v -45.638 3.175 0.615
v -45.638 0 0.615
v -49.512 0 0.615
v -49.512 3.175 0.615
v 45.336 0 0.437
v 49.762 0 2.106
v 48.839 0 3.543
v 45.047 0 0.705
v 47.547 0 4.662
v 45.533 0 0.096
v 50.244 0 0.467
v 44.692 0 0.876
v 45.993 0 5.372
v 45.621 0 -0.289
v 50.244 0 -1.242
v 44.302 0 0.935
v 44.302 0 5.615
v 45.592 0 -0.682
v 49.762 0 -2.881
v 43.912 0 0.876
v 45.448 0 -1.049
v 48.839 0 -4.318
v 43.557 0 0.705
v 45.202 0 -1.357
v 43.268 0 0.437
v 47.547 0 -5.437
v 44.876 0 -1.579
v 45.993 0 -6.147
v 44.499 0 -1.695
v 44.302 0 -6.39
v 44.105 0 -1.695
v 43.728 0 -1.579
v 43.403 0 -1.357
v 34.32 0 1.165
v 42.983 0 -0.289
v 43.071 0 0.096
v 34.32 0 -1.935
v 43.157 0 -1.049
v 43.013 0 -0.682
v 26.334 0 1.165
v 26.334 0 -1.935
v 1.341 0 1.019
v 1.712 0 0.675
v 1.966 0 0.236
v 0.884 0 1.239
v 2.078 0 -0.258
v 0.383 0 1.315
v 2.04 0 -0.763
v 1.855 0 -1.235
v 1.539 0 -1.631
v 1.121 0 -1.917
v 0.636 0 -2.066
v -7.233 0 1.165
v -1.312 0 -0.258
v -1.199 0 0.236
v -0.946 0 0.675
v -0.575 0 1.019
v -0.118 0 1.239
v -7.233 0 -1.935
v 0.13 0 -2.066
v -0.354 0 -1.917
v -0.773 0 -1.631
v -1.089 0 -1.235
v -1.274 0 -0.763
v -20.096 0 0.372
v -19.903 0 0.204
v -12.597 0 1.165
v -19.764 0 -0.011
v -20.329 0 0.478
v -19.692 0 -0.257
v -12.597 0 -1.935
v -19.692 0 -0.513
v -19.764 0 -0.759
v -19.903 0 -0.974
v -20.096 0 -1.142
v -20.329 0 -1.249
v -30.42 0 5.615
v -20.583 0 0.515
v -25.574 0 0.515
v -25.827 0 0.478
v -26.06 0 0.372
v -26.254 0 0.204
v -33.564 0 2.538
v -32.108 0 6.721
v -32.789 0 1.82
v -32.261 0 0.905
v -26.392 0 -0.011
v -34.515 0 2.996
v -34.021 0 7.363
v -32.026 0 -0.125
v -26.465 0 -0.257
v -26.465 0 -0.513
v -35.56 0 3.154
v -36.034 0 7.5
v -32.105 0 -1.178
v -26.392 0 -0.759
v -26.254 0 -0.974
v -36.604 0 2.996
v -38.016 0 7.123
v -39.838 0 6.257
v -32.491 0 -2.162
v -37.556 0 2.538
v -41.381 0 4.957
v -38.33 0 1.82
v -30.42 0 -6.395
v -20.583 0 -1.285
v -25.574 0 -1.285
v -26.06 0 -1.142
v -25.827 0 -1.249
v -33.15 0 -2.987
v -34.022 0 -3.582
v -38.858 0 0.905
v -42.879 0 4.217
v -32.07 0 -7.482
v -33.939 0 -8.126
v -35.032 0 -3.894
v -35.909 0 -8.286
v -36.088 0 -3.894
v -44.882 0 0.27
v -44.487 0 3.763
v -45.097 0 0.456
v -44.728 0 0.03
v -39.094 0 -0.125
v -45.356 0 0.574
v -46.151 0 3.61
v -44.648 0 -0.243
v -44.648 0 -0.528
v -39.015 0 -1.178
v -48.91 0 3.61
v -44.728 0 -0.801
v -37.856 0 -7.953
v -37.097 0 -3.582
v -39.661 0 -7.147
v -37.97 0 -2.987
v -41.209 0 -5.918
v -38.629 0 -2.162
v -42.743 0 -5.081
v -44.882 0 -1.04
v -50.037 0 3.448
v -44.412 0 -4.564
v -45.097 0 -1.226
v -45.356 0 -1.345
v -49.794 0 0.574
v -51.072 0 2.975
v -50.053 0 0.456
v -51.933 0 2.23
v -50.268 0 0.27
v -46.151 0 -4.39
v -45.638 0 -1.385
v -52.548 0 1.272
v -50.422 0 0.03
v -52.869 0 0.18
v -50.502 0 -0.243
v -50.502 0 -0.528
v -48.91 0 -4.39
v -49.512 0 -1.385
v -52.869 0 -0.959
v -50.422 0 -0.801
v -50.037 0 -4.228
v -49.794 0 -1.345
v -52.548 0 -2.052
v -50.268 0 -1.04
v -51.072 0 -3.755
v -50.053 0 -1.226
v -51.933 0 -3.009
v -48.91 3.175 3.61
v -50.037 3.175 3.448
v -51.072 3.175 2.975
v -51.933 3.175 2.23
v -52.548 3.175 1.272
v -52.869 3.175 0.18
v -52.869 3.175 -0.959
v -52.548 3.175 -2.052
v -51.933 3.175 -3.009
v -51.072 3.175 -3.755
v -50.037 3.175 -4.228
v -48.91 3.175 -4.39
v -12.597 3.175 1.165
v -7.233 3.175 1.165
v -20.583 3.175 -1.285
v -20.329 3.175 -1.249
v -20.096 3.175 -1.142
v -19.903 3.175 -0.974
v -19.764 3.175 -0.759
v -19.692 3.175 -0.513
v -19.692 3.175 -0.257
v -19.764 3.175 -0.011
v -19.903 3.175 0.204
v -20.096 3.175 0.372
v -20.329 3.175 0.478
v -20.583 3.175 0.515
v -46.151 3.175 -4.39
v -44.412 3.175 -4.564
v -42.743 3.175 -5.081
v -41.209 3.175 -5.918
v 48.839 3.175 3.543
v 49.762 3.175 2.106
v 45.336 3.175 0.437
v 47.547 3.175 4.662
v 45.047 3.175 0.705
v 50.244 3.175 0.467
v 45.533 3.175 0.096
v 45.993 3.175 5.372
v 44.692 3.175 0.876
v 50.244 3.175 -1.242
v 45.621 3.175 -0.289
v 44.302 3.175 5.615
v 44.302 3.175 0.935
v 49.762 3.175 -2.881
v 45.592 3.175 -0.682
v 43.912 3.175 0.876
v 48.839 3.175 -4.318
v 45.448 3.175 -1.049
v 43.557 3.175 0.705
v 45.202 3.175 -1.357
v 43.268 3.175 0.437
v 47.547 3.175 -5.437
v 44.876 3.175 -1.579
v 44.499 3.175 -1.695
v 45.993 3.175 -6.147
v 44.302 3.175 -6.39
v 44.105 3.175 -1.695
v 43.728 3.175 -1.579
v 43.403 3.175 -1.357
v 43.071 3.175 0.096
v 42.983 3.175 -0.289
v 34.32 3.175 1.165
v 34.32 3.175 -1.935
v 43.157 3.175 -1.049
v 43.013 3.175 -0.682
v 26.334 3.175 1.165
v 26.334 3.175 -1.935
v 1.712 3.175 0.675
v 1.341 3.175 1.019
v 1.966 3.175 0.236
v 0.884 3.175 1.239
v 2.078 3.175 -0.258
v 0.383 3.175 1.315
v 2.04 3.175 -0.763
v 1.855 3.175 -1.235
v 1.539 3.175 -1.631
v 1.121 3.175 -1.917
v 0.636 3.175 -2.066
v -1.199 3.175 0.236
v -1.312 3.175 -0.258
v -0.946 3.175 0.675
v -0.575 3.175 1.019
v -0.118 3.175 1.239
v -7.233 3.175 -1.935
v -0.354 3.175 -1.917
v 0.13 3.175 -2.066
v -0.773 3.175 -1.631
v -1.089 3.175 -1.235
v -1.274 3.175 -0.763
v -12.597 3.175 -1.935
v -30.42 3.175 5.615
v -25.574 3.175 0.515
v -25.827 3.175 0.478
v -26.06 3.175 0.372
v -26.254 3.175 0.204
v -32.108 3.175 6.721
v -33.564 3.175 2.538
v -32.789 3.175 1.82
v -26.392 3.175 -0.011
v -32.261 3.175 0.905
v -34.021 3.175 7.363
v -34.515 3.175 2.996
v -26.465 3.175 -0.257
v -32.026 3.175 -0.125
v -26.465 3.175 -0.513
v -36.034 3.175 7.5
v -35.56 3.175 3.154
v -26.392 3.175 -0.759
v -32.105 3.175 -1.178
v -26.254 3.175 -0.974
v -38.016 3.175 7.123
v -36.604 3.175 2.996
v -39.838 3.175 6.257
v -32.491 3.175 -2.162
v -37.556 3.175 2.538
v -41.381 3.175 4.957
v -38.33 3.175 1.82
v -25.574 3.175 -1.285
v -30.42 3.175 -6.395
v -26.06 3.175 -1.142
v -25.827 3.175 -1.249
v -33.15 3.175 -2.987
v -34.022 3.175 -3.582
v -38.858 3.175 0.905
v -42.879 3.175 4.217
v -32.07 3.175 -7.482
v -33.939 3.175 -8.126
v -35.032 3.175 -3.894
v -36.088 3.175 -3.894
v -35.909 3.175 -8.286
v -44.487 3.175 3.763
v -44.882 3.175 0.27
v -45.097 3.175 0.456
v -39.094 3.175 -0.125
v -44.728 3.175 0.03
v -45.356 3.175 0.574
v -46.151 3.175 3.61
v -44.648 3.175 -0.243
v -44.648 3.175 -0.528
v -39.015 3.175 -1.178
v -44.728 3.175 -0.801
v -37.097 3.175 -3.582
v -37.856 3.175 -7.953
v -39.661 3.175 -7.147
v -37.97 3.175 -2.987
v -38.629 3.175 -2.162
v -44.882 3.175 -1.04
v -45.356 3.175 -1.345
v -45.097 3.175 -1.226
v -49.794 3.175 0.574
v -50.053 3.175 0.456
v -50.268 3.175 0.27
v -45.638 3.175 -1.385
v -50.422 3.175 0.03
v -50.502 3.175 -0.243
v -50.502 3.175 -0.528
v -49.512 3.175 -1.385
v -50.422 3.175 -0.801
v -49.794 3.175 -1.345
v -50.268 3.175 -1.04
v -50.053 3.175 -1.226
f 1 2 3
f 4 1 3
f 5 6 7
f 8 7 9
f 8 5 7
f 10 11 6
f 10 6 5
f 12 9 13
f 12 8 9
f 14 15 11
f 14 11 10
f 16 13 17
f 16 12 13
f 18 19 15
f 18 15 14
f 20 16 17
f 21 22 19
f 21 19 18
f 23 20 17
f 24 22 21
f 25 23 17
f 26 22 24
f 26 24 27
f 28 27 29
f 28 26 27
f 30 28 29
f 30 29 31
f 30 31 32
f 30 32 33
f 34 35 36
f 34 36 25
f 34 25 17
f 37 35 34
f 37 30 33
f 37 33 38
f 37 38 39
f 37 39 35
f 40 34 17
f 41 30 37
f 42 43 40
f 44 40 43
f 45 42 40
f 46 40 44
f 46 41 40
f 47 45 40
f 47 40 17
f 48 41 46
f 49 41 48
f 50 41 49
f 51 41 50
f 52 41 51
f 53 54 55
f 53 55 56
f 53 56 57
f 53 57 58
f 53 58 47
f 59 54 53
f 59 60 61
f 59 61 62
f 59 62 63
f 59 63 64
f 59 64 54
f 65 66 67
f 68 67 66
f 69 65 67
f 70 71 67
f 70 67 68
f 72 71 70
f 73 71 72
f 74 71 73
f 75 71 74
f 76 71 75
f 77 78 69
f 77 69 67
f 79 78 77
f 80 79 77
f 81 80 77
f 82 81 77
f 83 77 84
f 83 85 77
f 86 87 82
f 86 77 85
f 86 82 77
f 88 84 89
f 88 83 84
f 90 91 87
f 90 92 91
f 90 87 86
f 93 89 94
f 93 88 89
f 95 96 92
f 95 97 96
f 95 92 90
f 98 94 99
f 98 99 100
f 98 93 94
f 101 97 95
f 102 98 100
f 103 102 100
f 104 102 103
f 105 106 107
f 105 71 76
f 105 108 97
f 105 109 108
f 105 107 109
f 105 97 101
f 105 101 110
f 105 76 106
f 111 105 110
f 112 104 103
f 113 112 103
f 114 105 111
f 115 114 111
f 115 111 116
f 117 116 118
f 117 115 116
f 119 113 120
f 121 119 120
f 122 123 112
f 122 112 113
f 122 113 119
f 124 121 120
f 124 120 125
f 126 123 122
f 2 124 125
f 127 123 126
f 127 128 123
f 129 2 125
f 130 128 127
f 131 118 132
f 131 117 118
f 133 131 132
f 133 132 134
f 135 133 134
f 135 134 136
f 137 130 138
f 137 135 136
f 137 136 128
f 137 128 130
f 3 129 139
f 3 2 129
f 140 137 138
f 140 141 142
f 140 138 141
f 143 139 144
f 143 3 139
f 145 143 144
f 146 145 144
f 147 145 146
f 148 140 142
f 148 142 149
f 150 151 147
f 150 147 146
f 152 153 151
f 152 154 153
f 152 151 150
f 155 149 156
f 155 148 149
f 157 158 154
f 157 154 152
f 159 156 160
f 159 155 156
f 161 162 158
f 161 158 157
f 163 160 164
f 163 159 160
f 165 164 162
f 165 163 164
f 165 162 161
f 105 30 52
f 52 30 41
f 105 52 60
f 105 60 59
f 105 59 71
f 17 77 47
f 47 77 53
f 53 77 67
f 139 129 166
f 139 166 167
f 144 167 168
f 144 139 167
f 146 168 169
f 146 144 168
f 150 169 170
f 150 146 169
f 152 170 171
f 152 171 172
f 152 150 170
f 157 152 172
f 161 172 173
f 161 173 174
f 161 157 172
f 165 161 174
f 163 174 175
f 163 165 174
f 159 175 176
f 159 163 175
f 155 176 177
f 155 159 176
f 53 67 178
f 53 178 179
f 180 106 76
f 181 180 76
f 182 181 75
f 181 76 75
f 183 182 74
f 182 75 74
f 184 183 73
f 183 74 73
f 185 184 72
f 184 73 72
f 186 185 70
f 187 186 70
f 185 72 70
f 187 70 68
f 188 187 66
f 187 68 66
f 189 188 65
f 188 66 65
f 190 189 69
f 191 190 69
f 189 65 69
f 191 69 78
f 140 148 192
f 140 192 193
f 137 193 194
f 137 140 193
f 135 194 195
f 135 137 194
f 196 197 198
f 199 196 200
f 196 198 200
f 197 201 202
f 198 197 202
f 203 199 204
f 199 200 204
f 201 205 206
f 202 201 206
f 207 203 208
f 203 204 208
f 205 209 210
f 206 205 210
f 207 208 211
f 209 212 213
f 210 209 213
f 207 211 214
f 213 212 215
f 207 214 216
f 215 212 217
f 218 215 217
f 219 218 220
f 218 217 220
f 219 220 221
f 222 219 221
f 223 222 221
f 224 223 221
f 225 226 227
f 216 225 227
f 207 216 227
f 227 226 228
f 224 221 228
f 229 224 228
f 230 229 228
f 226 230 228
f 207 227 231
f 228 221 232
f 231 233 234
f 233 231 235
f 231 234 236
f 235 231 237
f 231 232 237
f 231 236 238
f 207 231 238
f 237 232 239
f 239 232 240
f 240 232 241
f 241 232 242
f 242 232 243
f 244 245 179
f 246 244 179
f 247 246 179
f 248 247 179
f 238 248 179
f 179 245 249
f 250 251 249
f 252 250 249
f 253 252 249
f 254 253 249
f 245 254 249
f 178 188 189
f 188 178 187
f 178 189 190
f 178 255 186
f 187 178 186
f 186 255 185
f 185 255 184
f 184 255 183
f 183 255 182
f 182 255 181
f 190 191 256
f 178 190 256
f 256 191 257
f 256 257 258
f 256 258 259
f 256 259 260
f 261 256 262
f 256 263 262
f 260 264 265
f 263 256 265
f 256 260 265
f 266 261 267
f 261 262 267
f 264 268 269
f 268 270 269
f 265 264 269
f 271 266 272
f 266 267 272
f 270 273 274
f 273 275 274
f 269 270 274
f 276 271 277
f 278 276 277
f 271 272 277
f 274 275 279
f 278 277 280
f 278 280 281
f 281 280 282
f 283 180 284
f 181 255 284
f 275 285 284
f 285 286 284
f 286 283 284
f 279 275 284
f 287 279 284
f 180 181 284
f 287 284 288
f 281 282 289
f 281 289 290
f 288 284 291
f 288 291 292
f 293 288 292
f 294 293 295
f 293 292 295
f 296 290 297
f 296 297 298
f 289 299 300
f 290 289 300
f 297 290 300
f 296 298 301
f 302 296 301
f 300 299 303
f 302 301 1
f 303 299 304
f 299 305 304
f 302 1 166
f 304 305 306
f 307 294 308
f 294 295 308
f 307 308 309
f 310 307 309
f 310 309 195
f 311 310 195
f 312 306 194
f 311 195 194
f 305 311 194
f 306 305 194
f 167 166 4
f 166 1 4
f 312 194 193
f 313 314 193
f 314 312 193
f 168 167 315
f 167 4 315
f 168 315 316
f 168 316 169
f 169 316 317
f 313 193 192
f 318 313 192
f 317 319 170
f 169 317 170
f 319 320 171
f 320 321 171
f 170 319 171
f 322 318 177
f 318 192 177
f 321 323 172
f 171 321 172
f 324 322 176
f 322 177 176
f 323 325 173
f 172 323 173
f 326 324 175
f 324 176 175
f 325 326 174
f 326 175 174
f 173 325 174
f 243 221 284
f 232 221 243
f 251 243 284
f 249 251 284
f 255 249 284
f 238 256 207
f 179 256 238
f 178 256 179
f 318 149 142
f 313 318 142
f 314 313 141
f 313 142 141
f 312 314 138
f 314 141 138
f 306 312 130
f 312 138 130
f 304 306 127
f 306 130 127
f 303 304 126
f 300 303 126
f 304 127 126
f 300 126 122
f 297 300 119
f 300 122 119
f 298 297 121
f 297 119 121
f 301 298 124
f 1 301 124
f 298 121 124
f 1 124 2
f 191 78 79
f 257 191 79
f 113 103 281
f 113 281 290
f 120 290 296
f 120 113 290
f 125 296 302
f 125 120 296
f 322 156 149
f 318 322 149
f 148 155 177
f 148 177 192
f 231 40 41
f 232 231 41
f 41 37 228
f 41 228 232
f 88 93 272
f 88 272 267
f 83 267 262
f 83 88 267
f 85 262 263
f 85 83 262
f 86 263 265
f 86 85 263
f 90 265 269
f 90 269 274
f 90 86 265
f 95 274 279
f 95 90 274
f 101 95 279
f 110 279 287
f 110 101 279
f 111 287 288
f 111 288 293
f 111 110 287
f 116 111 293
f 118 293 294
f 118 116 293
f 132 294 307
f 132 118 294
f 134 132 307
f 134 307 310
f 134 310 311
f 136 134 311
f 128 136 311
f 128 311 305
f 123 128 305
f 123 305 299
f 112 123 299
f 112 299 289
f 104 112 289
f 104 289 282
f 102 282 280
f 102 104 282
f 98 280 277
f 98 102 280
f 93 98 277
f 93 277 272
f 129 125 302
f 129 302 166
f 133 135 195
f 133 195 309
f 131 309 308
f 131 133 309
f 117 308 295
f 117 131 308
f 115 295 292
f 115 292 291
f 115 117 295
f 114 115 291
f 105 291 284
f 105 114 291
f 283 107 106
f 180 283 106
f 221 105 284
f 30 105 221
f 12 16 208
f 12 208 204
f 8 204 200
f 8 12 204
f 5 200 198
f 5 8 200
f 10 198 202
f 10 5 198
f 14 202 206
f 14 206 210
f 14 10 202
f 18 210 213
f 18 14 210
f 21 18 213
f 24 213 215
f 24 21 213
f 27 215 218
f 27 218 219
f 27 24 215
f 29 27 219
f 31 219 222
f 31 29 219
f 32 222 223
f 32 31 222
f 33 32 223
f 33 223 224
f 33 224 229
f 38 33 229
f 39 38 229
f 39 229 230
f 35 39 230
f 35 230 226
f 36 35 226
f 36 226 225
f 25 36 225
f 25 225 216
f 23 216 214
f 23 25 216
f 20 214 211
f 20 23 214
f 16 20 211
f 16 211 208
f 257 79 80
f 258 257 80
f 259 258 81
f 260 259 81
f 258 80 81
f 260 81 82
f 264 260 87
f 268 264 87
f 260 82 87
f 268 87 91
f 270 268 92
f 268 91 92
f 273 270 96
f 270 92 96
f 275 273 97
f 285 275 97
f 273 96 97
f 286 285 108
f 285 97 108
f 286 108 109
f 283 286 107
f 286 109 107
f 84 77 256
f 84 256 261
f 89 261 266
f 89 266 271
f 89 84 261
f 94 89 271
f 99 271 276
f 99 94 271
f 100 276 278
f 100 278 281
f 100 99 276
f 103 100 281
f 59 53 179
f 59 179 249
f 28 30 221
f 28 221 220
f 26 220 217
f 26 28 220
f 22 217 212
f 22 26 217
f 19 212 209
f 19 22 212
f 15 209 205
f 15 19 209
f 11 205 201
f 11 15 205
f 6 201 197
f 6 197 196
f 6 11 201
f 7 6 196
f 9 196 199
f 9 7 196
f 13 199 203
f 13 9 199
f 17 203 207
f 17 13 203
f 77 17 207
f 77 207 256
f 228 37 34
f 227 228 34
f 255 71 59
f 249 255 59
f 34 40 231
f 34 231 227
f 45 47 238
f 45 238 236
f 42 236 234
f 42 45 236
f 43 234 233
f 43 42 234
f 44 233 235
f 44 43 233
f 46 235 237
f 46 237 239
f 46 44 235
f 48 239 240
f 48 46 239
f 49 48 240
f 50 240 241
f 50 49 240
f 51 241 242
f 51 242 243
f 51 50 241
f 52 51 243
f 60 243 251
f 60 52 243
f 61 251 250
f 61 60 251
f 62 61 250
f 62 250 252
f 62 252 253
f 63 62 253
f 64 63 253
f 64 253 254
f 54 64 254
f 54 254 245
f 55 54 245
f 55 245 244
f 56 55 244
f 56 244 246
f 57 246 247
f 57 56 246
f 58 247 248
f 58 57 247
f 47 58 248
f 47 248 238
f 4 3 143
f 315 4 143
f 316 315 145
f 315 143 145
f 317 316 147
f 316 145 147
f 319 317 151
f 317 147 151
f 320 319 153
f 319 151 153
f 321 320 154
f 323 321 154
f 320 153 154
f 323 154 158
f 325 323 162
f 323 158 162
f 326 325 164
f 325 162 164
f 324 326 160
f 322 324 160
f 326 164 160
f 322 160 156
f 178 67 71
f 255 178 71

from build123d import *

# Parameters (mm, degrees)
SKETCH1_R           = 1.322622219
SKETCH1_R_2         = 1.7
SKETCH1_R_3         = 3.543581518
SKETCH1_W           = 5.363642664
SKETCH1_H           = 3.09972609
BOSS_EXTRUDE1_DEPTH = 3.175


with BuildPart() as part:
    # Sketch1 → Boss-Extrude1 (new body)
    with BuildSketch(Plane(origin=(0, 0, 0), x_dir=(1, 0, 0), z_dir=(0, 1, 0))):
        with BuildLine():
            Line((-30.420224954, 6.394505262), (44.302185909, 6.390032423))
            ThreePointArc((44.302185909, 6.390032423), (50.304735151, 0.387483181), (44.302185909, -5.61506606))
            Line((44.302185909, -5.61506606), (-30.420308604, -5.61506606))
            ThreePointArc((-30.420308604, -5.61506606), (-36.033562007, -7.500021548), (-41.380965097, -4.957001462))
            ThreePointArc((-41.380965097, -4.957001462), (-43.672708861, -3.953506377), (-46.150888165, -3.610404055))
            Line((-46.150888165, -3.610404055), (-48.909665253, -3.610404055))
            ThreePointArc((-48.909665253, -3.610404055), (-52.90984424, 0.389774933), (-48.909665253, 4.38995392))
            Line((-48.909665253, 4.38995392), (-46.150888165, 4.38995392))
            ThreePointArc((-46.150888165, 4.38995392), (-43.564402624, 4.780712621), (-41.208786399, 5.918109658))
            ThreePointArc((-41.208786399, 5.918109658), (-35.908549497, 8.286044856), (-30.420224954, 6.394505262))
        make_face()
        with Locations(Location((44.302185909, 0.387483181, 0), (0, 0, 270))):
            Circle(SKETCH1_R, mode=Mode.SUBTRACT)
        with Locations(Location((0.383109325, 0.385153592, 0), (0, 0, 270))):
            Circle(SKETCH1_R_2, mode=Mode.SUBTRACT)
        with Locations(Location((-35.559869313, 0.389755399, 0), (0, 0, 270))):
            Circle(SKETCH1_R_3, mode=Mode.SUBTRACT)
        Polygon((34.320012777, 1.885218269), (34.320012777, 1.935143597), (26.334122715, 1.935143597), (26.334122715, 1.885218269), (26.334122715, -1.114852491), (26.334122715, -1.164973144), (34.320012777, -1.164973144), (34.320012777, -1.114852491), align=None, mode=Mode.SUBTRACT)
        with Locations((-9.914943428, 0.385085228)):
            Rectangle(SKETCH1_W, SKETCH1_H, mode=Mode.SUBTRACT)
        with BuildLine():
            Line((-20.582664571, -0.514889121), (-25.573840985, -0.514889121))
            ThreePointArc((-25.573840985, -0.514889121), (-26.473815335, 0.385085229), (-25.573840985, 1.285059578))
            Line((-25.573840985, 1.285059578), (-20.582664571, 1.285059578))
            ThreePointArc((-20.582664571, 1.285059578), (-19.682690221, 0.385085229), (-20.582664571, -0.514889121))
        make_face(mode=Mode.SUBTRACT)
        with BuildLine():
            Line((-49.512218616, 1.385222757), (-45.638080248, 1.385222757))
            ThreePointArc((-45.638080248, 1.385222757), (-44.638040384, 0.385182893), (-45.638080248, -0.614856971))
            Line((-45.638080248, -0.614856971), (-49.512218616, -0.614856971))
            ThreePointArc((-49.512218616, -0.614856971), (-50.51225848, 0.385182893), (-49.512218616, 1.385222757))
        make_face(mode=Mode.SUBTRACT)
    extrude(amount=BOSS_EXTRUDE1_DEPTH)


solid = part.part
